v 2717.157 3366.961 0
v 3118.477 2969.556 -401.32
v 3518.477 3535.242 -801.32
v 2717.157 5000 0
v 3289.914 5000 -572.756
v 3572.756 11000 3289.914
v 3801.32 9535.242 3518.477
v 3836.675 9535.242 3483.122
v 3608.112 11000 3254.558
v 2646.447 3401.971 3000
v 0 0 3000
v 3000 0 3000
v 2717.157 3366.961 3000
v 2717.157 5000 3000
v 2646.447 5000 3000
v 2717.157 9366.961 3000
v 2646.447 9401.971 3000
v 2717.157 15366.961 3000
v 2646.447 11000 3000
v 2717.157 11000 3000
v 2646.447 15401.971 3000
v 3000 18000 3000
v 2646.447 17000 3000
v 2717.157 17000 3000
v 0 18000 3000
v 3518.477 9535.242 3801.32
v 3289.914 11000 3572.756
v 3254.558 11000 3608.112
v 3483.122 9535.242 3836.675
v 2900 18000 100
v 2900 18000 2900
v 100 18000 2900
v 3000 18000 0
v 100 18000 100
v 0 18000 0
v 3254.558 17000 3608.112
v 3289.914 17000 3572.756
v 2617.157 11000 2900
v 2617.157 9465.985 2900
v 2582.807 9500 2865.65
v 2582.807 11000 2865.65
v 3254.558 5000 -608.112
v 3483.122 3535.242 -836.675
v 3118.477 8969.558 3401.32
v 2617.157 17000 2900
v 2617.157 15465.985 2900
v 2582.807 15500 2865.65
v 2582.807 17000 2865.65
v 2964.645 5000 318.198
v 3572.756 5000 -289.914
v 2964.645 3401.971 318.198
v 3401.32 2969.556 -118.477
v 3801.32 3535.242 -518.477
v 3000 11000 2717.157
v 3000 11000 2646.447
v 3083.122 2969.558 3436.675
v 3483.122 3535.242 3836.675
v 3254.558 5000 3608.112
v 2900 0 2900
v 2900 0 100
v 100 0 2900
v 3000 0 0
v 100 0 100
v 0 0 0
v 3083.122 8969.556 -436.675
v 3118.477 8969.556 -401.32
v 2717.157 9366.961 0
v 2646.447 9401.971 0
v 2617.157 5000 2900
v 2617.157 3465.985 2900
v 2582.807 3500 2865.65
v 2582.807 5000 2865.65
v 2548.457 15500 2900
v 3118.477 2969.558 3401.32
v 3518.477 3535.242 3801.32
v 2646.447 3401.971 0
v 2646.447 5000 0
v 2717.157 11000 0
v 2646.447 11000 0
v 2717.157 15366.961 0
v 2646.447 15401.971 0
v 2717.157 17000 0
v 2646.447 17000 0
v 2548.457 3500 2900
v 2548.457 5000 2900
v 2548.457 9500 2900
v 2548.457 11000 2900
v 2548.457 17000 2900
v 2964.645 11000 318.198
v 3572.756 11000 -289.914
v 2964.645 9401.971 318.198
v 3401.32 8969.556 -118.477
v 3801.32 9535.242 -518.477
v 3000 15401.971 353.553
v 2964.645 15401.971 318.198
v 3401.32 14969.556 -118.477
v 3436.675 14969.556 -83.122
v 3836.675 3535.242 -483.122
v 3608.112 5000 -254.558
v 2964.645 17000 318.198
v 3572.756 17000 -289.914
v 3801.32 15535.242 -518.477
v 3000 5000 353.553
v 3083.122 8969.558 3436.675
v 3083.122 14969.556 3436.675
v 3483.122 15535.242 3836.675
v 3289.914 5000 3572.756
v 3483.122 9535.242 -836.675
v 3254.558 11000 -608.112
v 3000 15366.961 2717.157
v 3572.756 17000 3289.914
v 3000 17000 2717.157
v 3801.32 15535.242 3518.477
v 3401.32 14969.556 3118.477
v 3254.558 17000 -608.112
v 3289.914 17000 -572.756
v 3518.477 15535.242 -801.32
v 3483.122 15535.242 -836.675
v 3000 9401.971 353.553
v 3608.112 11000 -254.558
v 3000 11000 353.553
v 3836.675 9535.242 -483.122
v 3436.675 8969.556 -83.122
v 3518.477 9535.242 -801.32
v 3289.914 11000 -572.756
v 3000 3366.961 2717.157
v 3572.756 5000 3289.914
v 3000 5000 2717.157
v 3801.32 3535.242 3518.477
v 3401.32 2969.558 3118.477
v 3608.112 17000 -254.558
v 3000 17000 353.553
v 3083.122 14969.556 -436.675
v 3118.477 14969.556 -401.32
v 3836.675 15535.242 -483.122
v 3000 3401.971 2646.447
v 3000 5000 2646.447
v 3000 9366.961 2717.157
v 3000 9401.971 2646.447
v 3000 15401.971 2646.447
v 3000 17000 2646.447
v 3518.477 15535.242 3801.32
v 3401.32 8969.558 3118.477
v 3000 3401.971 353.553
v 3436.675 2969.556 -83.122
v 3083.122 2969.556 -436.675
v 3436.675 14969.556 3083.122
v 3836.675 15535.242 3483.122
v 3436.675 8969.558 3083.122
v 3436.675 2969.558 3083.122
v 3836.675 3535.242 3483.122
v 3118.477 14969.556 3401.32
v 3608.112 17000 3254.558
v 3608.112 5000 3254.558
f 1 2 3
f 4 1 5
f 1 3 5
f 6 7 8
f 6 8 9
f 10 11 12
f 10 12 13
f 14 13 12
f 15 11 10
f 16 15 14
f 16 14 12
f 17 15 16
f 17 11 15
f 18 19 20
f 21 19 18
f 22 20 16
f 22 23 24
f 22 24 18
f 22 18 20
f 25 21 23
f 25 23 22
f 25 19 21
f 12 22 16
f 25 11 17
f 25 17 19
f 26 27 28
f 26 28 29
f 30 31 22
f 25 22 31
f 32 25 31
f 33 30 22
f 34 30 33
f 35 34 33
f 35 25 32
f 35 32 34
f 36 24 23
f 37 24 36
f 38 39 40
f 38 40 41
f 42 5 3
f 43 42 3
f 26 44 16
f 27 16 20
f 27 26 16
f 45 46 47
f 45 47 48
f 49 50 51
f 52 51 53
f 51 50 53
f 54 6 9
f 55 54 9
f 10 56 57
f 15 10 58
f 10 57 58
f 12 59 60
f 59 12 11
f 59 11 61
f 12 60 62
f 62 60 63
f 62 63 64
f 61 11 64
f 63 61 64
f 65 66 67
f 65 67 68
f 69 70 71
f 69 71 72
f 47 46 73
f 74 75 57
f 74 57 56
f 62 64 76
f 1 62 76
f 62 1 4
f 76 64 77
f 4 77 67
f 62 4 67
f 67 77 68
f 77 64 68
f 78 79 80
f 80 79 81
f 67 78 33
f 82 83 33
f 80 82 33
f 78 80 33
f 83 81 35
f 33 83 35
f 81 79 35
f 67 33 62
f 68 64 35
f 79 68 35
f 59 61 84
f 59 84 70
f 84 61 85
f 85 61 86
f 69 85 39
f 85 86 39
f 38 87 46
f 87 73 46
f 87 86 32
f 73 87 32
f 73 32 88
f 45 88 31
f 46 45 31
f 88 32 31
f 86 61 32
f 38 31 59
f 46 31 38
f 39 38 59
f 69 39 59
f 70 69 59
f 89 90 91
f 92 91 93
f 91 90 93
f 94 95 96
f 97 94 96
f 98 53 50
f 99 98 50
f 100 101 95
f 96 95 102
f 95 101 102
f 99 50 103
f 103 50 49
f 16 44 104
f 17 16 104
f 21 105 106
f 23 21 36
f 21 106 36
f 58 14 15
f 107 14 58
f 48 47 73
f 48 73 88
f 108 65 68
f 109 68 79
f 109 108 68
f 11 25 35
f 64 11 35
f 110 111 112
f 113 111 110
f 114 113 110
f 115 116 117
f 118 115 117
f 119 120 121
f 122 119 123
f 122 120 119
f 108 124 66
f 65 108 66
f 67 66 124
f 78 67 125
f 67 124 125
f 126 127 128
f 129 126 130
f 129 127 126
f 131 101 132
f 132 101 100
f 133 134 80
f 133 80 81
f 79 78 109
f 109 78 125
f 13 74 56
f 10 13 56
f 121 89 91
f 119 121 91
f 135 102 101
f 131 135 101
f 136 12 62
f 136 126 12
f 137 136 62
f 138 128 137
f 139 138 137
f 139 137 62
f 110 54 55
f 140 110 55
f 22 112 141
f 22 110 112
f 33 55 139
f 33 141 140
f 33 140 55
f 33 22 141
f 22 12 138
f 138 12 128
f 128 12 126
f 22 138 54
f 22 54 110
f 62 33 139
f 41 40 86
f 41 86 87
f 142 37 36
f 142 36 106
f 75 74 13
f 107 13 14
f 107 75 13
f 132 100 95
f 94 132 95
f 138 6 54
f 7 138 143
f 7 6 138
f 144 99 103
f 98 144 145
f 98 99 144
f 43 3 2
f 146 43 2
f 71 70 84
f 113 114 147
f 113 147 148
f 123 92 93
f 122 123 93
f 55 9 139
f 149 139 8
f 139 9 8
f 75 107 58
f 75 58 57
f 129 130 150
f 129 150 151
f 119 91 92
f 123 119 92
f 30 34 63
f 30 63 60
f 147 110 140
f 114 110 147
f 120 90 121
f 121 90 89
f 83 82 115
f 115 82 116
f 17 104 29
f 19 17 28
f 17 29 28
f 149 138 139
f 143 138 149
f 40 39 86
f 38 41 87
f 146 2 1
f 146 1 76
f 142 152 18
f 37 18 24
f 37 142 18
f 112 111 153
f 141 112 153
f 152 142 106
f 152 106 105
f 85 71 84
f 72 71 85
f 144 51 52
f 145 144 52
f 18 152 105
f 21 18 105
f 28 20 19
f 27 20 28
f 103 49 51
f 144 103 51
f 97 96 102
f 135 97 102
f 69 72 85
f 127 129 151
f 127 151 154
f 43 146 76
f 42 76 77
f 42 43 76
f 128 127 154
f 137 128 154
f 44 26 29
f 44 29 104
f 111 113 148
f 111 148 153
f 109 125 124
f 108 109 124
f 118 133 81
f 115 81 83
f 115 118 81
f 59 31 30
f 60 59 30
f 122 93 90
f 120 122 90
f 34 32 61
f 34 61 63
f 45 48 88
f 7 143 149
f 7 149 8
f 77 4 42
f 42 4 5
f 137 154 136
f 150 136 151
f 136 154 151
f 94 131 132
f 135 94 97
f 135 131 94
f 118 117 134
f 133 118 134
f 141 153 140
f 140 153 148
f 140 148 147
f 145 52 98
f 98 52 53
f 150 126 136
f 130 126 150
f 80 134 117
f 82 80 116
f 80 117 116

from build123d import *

# Parameters (mm, degrees)
SKETCH1_W             = 3000
SKETCH1_H             = 18000
BOSS_EXTRUDE1_DEPTH   = 3000
BOSS_EXTRUDE2_DEPTH   = 50
BOSS_EXTRUDE3_DEPTH   = 50
BOSS_EXTRUDE3_2_DEPTH = 50
BOSS_EXTRUDE3_3_DEPTH = 50
SKETCH5_W             = 2800
SKETCH5_H             = 2800
CUT_EXTRUDE1_DEPTH    = 18305
BOSS_EXTRUDE4_DEPTH   = 50
BOSS_EXTRUDE5_DEPTH   = 50


with BuildPart() as part:
    # Sketch1 → Boss-Extrude1 (new body)
    with BuildSketch(Plane(origin=(0, 0, 0), x_dir=(0, 0, -1), z_dir=(1, 0, 0))):
        with Locations((-1500, 9000)):
            Rectangle(SKETCH1_W, SKETCH1_H)
    extrude(amount=BOSS_EXTRUDE1_DEPTH)

    # Sketch3 → Boss-Extrude2 (add)
    with BuildSketch(Plane(origin=(1358.578643763, 0, 1358.578643763), x_dir=(0, 1, 0), z_dir=(-0.707106781, 0, -0.707106781))):
        Polygon((17000, 1731.32034356), (17000, 2731.32034356), (15535.241545901, 3054.55813706), (14969.556120952, 2488.87271211), (15500, 1731.32034356), align=None)
        Polygon((11000, 1731.32034356), (11000, 2731.32034356), (9535.241545901, 3054.55813706), (8969.556120952, 2488.87271211), (9500, 1731.32034356), align=None)
        Polygon((5000, 1731.32034356), (5000, 2731.32034356), (3535.241545901, 3054.55813706), (2969.556120952, 2488.87271211), (3500, 1731.32034356), align=None)
    extrude(amount=BOSS_EXTRUDE2_DEPTH)

    # Sketch5 → Cut-Extrude1 (cut)
    with BuildSketch(Plane(origin=(0, 18000, 0), x_dir=(1, 0, 0), z_dir=(0, 1, 0))):
        with Locations((1500, -1500)):
            Rectangle(SKETCH5_W, SKETCH5_H)
    extrude(amount=-CUT_EXTRUDE1_DEPTH, mode=Mode.SUBTRACT)

    # Sketch8 → Boss-Extrude4 (add)
    with BuildSketch(Plane(origin=(-141.421356237, 0, 141.421356237), x_dir=(0, -1, 0), z_dir=(-0.707106781, 0, 0.707106781))):
        Polygon((-3500.000000001, 3852.640687119), (-5000, 3852.640687119), (-5000, 4852.640687119), (-3535.241545901, 5175.878480619), (-2969.557622603, 4610.19305567), align=None)
        Polygon((-9500, 3852.640687119), (-11000, 3852.640687119), (-11000, 4852.640687119), (-9535.241545901, 5175.878480619), (-8969.557622602, 4610.19305567), align=None)
        Polygon((-15500, 3852.640687119), (-17000, 3852.640687119), (-17000, 4852.640687119), (-15535.241545901, 5175.878480619), (-14969.556120952, 4610.19305567), align=None)
    extrude(amount=BOSS_EXTRUDE4_DEPTH)

    # Sketch9 → Boss-Extrude5 (add)
    with BuildSketch(Plane(origin=(141.421356237, 0, -141.421356237), x_dir=(0, -1, 0), z_dir=(-0.707106781, 0, 0.707106781))):
        Polygon((-5000, 3992.640687119), (-3401.971222165, 3992.640687119), (-2969.557622603, 4610.19305567), (-3535.241545901, 5175.878480619), (-5000, 4852.640687119), align=None)
        Polygon((-11000, 3992.640687119), (-9401.971222164, 3992.640687119), (-8969.557622602, 4610.19305567), (-9535.241545901, 5175.878480619), (-11000, 4852.640687119), align=None)
        Polygon((-17000, 3992.640687119), (-15401.970944651, 3992.640687119), (-14969.556120952, 4610.19305567), (-15535.241545901, 5175.878480619), (-17000, 4852.640687119), align=None)
    extrude(amount=-BOSS_EXTRUDE5_DEPTH)


with BuildPart() as body_2:
    # Sketch4 → Boss-Extrude3 (new body)
    with BuildSketch(Plane(origin=(1641.421356237, 0, 1641.421356237), x_dir=(0, 1, 0), z_dir=(-0.707106781, 0, -0.707106781))):
        Polygon((5000, 2731.32034356), (5000, 1871.32034356), (3401.970944651, 1871.32034356), (2969.556120952, 2488.87271211), (3535.241545901, 3054.55813706), align=None)
    extrude(amount=-BOSS_EXTRUDE3_DEPTH)


with BuildPart() as body_3:
    # Sketch4 → Boss-Extrude3 2 (new body)
    with BuildSketch(Plane(origin=(1641.421356237, 0, 1641.421356237), x_dir=(0, 1, 0), z_dir=(-0.707106781, 0, -0.707106781))):
        Polygon((11000, 2731.32034356), (11000, 1871.32034356), (9401.970944651, 1871.32034356), (8969.556120952, 2488.87271211), (9535.241545901, 3054.55813706), align=None)
    extrude(amount=-BOSS_EXTRUDE3_2_DEPTH)


with BuildPart() as body_4:
    # Sketch4 → Boss-Extrude3 3 (new body)
    with BuildSketch(Plane(origin=(1641.421356237, 0, 1641.421356237), x_dir=(0, 1, 0), z_dir=(-0.707106781, 0, -0.707106781))):
        Polygon((17000, 2731.32034356), (17000, 1871.32034356), (15401.970944651, 1871.32034356), (14969.556120952, 2488.87271211), (15535.241545901, 3054.55813706), align=None)
    extrude(amount=-BOSS_EXTRUDE3_3_DEPTH)


solid = Compound([part.part, body_2.part, body_3.part, body_4.part])
